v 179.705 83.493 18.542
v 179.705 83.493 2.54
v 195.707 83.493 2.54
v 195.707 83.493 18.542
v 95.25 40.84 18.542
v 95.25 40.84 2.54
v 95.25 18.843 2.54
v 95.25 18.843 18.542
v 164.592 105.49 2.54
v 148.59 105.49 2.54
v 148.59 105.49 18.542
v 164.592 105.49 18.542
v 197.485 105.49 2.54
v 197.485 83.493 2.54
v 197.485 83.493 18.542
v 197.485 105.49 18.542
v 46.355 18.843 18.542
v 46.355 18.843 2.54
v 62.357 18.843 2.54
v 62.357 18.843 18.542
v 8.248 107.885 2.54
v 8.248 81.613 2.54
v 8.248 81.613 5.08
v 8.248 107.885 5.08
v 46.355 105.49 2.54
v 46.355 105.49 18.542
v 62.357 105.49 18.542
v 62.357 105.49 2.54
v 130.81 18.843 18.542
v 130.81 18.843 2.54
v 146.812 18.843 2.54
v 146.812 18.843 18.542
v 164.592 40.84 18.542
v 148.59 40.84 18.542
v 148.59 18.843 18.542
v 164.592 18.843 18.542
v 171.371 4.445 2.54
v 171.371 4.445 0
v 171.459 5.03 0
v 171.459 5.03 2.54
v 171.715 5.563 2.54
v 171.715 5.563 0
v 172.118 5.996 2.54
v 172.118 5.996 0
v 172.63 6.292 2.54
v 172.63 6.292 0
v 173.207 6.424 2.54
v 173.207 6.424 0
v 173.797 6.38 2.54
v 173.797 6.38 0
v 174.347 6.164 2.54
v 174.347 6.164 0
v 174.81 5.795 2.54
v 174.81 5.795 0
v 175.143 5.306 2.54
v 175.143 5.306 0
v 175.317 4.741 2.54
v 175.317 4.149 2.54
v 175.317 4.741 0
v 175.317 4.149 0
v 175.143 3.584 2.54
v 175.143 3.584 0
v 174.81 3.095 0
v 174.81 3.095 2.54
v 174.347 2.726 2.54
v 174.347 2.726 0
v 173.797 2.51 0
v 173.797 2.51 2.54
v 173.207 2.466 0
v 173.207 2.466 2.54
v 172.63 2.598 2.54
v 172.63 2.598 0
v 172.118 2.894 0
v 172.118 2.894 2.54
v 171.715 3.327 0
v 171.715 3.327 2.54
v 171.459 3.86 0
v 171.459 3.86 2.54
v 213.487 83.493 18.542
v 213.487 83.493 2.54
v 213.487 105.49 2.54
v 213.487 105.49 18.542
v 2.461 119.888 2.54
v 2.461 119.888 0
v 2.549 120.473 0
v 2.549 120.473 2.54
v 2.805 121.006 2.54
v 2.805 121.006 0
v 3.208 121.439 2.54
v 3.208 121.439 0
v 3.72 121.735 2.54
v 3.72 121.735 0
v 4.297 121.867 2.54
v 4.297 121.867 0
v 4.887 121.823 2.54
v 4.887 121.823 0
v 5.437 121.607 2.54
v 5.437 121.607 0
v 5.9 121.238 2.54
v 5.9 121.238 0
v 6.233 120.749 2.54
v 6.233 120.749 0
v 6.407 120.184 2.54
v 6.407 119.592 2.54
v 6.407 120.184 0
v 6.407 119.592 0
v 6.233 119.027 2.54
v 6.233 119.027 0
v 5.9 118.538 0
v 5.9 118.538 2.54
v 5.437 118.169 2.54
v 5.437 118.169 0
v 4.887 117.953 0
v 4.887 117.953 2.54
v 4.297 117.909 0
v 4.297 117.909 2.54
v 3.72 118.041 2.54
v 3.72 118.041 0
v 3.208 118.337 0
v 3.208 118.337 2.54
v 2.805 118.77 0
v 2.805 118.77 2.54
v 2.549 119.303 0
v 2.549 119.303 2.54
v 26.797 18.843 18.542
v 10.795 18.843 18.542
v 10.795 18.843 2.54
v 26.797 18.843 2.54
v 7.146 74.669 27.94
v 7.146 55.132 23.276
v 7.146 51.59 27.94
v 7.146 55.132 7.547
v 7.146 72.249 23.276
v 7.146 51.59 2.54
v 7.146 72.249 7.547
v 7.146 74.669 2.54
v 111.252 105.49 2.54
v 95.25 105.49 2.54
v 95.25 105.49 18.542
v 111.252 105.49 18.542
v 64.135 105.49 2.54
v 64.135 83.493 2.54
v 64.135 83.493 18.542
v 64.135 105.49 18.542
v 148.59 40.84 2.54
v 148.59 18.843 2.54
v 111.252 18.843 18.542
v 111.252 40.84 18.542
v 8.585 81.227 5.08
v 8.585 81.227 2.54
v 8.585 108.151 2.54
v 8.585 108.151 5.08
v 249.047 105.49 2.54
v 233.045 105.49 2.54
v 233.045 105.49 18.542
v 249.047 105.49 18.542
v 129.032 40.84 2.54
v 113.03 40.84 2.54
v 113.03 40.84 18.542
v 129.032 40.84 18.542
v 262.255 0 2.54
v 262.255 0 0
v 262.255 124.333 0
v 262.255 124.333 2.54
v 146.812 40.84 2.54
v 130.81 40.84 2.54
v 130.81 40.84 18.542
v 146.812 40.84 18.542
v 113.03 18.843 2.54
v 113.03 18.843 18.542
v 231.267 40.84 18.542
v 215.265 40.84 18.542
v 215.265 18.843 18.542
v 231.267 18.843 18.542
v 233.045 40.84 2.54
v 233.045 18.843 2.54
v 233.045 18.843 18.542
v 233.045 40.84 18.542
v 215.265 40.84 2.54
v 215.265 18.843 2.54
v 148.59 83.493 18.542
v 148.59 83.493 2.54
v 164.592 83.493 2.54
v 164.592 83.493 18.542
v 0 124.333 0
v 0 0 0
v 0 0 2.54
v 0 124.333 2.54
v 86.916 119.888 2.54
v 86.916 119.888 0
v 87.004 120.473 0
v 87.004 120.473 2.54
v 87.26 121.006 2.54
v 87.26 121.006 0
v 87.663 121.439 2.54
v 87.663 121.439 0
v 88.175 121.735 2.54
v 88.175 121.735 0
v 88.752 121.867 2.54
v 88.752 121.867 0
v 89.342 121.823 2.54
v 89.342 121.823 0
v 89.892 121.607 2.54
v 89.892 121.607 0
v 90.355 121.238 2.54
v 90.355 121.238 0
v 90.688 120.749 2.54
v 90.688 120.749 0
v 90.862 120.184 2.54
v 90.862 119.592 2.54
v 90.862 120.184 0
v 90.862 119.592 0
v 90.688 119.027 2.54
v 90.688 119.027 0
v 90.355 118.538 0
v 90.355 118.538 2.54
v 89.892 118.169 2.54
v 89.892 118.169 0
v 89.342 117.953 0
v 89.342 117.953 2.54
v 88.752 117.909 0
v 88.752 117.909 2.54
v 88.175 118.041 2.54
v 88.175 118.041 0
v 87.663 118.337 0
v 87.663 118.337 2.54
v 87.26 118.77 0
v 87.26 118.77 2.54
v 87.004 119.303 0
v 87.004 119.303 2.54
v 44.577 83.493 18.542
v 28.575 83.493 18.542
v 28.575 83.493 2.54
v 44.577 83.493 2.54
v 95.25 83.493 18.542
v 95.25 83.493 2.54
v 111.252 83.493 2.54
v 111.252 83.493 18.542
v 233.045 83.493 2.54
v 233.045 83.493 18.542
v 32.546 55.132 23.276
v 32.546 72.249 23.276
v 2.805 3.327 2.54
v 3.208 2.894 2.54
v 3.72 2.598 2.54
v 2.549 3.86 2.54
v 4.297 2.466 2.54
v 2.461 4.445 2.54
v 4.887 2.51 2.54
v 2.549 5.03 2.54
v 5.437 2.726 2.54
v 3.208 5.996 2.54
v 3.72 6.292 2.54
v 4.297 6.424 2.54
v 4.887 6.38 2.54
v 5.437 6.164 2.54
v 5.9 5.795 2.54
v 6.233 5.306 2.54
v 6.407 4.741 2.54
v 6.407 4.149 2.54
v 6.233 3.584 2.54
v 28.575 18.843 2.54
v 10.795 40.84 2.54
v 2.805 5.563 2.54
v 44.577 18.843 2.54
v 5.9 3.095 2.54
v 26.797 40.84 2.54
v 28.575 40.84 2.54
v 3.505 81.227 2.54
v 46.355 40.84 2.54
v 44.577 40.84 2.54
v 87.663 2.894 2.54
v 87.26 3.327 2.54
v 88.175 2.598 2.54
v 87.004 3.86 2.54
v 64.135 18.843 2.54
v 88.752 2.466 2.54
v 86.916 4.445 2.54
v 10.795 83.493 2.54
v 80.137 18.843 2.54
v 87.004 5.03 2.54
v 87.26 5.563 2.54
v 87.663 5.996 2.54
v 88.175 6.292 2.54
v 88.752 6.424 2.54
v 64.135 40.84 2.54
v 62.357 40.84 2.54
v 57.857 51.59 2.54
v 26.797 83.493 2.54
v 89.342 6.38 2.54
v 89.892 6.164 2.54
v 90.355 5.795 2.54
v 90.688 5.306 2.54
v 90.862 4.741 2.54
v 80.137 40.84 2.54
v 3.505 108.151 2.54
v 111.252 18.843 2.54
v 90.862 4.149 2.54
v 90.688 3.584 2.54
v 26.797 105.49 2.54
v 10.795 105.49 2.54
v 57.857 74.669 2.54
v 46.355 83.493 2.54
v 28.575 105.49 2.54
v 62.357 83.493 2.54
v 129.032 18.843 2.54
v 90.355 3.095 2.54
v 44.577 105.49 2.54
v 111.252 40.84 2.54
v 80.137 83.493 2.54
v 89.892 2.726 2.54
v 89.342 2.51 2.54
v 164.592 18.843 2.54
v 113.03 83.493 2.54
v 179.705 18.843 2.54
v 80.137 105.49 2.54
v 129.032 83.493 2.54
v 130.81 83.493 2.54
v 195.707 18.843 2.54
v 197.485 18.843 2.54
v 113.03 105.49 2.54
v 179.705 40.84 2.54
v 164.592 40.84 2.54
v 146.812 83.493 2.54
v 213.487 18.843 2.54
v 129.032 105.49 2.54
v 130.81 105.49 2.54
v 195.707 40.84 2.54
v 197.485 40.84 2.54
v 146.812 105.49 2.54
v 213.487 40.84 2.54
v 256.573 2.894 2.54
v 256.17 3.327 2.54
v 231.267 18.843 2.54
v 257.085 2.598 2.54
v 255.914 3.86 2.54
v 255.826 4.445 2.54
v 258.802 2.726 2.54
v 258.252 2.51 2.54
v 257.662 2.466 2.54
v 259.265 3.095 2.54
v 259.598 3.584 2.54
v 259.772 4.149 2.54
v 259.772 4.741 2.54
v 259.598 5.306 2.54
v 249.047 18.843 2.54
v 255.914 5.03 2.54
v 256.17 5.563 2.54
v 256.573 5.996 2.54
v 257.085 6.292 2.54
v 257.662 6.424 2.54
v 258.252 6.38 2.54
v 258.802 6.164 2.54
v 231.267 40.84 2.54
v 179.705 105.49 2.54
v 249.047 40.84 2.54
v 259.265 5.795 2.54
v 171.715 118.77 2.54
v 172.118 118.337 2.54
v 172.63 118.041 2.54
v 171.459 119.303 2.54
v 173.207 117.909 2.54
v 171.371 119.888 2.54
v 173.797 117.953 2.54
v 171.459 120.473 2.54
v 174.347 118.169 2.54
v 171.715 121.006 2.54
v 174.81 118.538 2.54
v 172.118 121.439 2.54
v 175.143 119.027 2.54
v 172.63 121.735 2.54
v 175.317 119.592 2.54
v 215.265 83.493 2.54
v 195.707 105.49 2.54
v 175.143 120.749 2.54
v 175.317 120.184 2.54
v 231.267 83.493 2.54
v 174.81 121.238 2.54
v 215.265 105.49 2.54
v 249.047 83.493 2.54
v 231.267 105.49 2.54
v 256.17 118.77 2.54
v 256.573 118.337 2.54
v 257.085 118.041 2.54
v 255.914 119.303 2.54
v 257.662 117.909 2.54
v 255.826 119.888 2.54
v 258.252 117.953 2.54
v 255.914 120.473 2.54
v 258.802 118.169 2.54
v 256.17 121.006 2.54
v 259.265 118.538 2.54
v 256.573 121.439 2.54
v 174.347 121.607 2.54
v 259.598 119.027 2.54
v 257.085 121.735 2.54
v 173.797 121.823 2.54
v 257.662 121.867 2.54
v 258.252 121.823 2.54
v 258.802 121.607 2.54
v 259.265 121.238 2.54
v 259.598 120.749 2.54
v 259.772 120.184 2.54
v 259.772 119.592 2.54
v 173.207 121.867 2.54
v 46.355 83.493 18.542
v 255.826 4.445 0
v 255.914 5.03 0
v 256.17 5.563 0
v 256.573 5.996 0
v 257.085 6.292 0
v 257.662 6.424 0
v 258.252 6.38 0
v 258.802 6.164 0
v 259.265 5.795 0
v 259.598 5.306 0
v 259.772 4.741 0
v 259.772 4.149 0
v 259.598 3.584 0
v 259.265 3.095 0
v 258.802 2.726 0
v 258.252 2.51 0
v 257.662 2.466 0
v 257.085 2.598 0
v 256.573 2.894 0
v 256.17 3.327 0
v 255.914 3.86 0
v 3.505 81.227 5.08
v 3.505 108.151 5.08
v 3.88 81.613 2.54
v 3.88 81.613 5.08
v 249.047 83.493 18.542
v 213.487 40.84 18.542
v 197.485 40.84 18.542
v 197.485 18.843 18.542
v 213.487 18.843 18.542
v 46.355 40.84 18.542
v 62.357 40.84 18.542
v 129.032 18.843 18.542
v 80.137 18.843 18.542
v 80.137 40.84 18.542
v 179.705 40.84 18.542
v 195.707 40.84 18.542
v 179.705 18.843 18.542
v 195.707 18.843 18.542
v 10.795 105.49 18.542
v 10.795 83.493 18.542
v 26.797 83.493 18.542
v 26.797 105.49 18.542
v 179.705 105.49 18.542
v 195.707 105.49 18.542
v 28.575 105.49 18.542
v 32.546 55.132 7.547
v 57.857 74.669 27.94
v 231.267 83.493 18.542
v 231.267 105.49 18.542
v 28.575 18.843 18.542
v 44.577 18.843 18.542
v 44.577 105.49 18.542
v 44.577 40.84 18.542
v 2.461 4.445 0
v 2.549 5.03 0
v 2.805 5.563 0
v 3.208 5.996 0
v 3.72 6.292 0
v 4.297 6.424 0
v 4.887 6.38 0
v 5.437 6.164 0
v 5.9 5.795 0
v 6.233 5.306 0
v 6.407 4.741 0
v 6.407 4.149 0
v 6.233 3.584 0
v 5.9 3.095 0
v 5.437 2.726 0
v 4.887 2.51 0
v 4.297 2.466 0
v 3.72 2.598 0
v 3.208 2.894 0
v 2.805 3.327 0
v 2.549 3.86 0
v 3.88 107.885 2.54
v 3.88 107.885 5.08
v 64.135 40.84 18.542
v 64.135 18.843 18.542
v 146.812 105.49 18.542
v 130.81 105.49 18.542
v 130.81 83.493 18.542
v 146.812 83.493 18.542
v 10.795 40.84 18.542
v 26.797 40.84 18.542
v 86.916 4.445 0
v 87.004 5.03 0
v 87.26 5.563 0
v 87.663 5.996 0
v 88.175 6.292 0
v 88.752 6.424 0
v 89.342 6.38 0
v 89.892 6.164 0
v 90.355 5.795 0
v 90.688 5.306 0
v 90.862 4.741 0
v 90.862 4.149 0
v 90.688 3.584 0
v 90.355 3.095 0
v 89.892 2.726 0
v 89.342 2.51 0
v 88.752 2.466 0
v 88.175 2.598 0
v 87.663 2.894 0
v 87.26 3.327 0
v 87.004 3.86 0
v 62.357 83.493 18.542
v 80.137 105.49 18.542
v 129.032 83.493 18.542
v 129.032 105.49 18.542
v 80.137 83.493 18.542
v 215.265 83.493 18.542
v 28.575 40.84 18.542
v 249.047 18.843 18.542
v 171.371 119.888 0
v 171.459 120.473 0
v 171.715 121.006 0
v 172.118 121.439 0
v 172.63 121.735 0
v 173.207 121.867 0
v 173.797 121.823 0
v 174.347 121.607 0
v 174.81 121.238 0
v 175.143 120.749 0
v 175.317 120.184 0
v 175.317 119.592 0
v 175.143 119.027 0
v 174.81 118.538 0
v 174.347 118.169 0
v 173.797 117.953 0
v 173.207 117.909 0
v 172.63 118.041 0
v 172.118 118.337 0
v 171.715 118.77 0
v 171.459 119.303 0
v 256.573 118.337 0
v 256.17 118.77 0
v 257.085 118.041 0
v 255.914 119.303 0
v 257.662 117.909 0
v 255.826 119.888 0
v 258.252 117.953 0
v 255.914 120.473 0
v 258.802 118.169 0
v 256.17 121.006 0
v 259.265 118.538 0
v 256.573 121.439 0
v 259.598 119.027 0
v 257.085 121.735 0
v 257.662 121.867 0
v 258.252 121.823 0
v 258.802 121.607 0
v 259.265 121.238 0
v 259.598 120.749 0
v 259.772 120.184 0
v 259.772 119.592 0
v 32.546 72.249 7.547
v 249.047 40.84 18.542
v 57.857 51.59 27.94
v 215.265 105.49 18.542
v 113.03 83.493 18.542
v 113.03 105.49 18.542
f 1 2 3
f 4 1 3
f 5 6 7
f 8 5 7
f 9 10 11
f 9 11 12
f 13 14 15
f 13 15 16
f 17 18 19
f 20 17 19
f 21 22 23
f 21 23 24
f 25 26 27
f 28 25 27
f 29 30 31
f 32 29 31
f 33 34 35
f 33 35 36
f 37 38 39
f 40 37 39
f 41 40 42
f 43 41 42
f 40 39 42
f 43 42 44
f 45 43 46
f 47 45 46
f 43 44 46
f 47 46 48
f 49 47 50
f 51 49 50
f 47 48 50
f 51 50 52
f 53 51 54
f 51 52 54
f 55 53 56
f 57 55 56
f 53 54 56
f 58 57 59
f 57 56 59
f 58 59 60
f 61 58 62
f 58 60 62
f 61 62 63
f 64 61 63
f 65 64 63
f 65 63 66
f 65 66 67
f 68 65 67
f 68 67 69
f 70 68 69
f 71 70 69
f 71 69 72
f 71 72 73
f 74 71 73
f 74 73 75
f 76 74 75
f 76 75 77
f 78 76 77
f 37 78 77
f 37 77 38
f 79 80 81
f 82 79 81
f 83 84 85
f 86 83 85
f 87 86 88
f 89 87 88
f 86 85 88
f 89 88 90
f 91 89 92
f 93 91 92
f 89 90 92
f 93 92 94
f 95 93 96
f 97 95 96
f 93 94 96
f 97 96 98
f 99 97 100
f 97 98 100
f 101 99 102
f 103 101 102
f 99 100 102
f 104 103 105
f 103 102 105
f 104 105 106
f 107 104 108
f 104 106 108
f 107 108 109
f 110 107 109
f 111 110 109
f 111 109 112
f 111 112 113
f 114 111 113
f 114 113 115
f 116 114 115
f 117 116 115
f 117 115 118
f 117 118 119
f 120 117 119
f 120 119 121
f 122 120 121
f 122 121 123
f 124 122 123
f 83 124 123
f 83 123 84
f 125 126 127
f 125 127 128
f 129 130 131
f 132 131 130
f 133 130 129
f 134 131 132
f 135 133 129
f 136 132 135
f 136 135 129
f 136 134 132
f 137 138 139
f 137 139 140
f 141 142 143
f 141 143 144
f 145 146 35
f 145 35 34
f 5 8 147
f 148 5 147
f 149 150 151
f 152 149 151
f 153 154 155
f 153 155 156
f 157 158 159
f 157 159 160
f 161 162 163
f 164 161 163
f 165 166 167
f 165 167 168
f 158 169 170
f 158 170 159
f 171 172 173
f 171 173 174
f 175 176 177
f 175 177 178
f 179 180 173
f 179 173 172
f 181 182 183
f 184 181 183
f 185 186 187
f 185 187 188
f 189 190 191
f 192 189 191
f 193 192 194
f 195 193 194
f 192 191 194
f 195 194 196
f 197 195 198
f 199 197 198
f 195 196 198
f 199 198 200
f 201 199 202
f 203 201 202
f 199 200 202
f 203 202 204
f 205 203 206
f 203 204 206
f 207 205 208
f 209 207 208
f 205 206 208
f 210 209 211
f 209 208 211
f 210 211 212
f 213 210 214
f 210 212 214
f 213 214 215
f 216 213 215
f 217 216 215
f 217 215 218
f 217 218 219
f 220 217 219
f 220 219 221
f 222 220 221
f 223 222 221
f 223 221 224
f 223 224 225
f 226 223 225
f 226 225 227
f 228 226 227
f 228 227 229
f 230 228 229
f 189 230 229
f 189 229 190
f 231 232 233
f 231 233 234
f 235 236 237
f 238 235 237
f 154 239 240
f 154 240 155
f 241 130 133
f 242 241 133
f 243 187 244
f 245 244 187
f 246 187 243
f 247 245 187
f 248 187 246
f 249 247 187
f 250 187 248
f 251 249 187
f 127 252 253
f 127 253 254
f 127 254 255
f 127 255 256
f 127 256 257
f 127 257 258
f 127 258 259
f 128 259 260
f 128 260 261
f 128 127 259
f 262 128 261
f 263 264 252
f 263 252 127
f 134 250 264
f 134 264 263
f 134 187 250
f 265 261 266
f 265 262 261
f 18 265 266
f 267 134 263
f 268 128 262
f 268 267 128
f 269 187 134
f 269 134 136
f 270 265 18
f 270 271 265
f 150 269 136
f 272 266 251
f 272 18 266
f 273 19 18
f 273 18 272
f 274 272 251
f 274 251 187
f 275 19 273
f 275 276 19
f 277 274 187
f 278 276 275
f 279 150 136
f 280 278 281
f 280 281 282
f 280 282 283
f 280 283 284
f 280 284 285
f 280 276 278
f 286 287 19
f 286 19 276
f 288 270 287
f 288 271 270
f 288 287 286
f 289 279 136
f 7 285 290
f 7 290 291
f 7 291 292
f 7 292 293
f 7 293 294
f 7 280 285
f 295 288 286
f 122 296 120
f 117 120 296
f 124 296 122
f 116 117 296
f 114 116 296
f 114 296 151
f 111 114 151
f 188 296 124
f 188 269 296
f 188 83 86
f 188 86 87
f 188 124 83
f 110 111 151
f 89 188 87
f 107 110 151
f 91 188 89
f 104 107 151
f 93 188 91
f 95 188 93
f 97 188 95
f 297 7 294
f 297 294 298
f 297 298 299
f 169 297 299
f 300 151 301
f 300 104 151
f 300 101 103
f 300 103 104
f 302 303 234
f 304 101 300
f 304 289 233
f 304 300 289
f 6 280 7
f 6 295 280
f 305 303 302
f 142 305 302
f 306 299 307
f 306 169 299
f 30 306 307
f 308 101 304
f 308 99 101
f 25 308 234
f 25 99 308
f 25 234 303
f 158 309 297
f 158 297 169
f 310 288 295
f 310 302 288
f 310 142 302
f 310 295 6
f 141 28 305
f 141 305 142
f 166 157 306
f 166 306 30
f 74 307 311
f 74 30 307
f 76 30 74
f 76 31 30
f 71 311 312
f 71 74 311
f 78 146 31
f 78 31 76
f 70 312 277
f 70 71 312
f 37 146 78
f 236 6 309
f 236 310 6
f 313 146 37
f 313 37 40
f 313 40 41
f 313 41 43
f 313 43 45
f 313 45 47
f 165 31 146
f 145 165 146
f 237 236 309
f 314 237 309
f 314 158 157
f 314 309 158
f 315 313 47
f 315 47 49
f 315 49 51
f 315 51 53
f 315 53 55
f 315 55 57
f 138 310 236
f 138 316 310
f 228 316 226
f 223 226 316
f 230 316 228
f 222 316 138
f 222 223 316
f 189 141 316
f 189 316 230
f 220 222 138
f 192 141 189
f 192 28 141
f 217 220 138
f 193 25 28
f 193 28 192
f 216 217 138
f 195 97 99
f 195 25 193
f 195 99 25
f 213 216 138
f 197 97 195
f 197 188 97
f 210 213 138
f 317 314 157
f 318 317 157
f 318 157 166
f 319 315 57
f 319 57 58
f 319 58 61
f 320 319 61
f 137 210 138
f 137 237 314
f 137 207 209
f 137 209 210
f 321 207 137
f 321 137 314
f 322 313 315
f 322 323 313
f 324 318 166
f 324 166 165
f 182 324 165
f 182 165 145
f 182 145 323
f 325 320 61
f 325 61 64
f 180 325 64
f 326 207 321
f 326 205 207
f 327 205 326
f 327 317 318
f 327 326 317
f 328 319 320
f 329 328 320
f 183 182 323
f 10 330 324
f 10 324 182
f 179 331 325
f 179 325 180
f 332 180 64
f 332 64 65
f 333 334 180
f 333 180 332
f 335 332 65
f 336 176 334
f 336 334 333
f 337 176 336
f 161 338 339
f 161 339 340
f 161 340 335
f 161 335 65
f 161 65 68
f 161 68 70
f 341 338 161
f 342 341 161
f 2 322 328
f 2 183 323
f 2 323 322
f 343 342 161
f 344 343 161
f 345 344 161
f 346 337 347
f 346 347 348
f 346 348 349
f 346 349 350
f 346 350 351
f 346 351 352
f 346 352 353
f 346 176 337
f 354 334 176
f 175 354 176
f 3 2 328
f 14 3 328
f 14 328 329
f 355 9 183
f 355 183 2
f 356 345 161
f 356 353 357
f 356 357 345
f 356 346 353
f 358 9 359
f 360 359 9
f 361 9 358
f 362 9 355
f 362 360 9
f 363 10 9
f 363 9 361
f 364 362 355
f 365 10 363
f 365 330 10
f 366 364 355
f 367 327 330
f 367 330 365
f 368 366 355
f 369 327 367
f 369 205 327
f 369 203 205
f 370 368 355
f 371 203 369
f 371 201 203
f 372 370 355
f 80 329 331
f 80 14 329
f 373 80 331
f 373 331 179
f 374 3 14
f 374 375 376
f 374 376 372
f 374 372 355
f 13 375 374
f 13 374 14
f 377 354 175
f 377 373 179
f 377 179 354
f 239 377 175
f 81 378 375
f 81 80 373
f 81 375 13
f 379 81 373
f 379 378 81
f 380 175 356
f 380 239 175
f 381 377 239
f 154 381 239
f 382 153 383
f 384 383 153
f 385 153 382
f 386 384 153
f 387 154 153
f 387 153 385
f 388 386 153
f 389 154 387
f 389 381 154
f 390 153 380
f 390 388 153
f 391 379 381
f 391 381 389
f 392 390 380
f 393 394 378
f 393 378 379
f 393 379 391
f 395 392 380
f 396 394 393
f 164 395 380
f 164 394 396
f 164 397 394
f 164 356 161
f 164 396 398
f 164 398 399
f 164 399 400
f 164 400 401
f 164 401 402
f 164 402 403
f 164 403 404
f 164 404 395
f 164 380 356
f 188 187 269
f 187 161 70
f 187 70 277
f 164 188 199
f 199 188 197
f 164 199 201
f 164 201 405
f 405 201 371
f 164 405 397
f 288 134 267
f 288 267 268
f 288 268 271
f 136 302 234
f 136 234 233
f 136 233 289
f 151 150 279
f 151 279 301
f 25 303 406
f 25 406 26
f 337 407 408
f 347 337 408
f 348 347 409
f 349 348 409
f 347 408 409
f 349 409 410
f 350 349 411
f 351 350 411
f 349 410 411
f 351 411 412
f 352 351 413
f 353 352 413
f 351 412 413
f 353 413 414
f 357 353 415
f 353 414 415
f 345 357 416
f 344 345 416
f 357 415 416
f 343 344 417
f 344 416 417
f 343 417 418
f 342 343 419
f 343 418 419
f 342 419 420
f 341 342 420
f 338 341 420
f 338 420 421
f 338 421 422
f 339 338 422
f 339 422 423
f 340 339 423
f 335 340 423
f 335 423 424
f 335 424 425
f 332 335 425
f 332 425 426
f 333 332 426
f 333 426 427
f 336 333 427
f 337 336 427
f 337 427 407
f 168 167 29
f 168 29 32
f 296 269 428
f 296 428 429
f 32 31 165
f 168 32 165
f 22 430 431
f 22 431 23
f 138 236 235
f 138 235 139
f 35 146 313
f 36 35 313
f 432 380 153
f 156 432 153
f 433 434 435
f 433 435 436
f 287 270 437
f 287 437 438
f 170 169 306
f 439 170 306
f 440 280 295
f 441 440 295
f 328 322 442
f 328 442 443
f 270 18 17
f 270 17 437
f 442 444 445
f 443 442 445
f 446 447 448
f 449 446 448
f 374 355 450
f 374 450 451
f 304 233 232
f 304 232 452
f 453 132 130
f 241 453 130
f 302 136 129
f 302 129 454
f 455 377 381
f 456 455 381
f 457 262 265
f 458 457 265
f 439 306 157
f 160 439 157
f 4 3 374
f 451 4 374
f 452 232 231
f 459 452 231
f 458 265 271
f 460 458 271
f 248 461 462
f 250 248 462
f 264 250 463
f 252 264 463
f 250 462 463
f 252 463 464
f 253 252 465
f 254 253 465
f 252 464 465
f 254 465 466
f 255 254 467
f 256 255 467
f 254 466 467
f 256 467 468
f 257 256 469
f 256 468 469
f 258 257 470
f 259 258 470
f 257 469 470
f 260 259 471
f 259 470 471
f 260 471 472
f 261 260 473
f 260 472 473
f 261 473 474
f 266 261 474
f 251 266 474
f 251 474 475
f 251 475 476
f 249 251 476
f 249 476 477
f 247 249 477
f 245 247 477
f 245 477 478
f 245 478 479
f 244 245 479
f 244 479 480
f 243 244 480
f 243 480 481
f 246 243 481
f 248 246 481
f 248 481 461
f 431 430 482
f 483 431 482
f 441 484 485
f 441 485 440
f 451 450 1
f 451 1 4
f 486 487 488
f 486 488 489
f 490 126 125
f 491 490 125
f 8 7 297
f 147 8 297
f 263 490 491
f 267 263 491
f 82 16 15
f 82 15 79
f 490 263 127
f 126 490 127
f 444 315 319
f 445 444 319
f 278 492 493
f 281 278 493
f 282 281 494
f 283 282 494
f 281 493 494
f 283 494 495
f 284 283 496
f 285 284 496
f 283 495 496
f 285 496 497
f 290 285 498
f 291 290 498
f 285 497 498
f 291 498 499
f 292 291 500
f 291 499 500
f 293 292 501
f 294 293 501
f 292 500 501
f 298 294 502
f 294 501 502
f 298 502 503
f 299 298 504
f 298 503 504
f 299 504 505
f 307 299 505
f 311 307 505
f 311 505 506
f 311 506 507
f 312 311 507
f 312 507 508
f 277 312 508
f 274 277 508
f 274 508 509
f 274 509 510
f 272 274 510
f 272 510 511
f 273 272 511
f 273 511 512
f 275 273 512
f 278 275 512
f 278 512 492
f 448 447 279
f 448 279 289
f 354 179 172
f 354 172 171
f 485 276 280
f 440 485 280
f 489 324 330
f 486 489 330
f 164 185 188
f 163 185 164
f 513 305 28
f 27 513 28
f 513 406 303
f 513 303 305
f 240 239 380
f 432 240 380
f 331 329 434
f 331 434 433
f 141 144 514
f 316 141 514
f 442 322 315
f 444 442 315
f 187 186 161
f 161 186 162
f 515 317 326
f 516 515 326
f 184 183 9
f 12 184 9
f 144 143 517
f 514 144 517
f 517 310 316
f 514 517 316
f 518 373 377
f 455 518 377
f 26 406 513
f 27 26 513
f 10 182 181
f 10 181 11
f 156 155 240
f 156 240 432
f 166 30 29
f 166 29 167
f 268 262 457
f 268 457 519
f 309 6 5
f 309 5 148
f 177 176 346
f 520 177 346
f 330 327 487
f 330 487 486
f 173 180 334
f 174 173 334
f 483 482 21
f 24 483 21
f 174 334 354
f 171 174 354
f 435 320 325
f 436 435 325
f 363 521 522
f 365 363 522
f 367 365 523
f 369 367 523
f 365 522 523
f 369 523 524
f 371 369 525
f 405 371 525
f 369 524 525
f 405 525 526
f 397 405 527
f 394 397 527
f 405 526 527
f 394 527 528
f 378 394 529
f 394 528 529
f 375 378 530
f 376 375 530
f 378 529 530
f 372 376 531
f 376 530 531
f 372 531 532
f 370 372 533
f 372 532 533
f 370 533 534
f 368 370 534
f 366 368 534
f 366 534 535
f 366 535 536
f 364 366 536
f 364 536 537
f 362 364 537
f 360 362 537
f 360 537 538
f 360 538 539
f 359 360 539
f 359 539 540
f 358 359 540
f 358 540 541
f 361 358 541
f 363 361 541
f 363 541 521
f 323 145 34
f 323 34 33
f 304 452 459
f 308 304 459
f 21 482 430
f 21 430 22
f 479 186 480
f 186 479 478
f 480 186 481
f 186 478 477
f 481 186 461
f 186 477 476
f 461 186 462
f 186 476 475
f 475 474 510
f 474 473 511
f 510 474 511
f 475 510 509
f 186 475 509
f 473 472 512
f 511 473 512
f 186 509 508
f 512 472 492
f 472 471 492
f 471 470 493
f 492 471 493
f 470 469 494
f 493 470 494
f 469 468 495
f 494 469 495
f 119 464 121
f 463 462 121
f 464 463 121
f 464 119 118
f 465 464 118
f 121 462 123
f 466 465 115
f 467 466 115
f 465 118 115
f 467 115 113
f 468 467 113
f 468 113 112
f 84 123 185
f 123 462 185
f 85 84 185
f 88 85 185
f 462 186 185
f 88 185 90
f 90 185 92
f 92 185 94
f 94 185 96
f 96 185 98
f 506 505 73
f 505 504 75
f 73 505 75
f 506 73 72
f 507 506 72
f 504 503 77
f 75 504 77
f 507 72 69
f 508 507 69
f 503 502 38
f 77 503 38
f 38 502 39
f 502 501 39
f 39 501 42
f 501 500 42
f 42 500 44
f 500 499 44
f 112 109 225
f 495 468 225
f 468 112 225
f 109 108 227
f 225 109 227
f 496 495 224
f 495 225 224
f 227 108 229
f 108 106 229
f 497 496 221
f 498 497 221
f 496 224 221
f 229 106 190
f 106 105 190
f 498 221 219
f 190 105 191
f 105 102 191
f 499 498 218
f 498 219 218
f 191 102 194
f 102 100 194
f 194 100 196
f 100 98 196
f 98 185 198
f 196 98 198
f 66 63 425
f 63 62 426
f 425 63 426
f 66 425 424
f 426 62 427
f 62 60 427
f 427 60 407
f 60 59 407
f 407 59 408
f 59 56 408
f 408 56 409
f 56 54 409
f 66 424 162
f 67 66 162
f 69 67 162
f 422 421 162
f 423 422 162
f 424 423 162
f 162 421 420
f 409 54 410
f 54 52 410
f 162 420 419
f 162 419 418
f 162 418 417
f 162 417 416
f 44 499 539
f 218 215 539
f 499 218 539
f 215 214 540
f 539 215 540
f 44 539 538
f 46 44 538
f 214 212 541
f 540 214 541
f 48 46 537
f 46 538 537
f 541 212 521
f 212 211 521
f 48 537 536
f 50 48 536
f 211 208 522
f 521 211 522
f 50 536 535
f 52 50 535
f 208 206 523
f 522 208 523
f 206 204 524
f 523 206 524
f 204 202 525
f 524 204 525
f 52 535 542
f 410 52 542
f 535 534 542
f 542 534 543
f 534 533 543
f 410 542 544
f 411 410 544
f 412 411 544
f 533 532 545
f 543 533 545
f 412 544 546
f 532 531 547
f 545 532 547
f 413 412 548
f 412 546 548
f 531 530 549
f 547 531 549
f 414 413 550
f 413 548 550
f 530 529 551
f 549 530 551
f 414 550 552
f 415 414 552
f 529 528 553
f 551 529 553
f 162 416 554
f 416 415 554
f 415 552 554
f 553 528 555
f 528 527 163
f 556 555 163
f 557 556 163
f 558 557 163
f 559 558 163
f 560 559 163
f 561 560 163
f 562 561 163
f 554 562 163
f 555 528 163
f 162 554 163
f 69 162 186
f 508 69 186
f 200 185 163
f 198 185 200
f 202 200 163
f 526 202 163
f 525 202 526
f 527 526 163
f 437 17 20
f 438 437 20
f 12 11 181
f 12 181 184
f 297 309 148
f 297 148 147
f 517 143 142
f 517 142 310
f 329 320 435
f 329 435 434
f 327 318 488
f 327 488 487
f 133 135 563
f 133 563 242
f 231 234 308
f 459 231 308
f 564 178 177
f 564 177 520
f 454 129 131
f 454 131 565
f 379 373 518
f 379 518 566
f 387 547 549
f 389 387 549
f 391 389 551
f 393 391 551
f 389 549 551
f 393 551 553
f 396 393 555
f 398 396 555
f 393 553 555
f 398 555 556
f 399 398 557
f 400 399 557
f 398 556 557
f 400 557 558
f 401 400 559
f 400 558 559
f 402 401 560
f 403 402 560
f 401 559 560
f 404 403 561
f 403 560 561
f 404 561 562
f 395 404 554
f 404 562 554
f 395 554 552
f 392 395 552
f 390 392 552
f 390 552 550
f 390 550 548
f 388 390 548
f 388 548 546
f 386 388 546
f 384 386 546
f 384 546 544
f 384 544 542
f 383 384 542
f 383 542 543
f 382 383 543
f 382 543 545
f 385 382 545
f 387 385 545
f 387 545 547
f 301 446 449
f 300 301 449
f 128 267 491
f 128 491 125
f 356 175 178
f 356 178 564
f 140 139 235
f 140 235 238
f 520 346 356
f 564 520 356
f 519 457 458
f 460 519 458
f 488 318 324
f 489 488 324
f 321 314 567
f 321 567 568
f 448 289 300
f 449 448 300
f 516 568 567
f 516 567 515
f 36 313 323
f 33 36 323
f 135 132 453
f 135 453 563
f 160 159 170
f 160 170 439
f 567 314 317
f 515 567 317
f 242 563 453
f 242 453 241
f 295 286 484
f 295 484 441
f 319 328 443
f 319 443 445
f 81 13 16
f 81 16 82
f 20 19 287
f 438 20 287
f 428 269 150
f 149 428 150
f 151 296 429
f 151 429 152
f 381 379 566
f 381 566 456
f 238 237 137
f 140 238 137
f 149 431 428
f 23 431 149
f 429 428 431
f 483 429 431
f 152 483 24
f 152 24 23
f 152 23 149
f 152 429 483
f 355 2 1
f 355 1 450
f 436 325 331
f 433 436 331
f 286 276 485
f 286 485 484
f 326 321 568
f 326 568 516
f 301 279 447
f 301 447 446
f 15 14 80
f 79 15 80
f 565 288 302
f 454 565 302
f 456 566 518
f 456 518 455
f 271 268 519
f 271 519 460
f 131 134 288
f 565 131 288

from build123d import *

# Parameters (mm, degrees)
SKETCH1_W                       = 262.255
SKETCH1_H                       = 124.333
BOSS_EXTRUDE1_DEPTH             = 2.54
F_5_32_0_15625_DIAMETER_HOLE1_D = 3.96875
SKETCH12_W                      = 5.08
SKETCH12_H                      = 26.924
SKETCH12_W_2                    = 4.367686067
SKETCH12_H_2                    = 26.272785271
BOSS_EXTRUDE2_DEPTH             = 2.54
SKETCH13_W                      = 50.710492808
SKETCH13_H                      = 23.078831344
BOSS_EXTRUDE3_DEPTH             = 25.4
SKETCH14_W                      = 15.728561486
SKETCH14_H                      = 17.117120152
CUT_EXTRUDE1_DEPTH              = 25.4
SKETCH16_W                      = 16.002
SKETCH16_H                      = 21.9964
BOSS_EXTRUDE5_DEPTH             = 16.002
LPATTERN1_COUNT                 = 4
LPATTERN1_PITCH                 = 17.78
MIRROR1_COPY_1_SKETCH_W         = 16.002
MIRROR1_COPY_1_SKETCH_H         = 21.9964
MIRROR1_COPY_1_DEPTH            = 16.002
MIRROR1_COPY_2_SKETCH_W         = 16.002
MIRROR1_COPY_2_SKETCH_H         = 21.9964
MIRROR1_COPY_2_DEPTH            = 16.002
MIRROR1_COPY_3_SKETCH_W         = 16.002
MIRROR1_COPY_3_SKETCH_H         = 21.9964
MIRROR1_COPY_3_DEPTH            = 16.002


with BuildPart() as part:
    # Sketch1 → Boss-Extrude1 (new body)
    with BuildSketch(Plane.XY):
        with Locations((131.1275, 62.1665)):
            Rectangle(SKETCH1_W, SKETCH1_H)
    extrude(amount=BOSS_EXTRUDE1_DEPTH)

    # 5/32 (0.15625) Diameter Hole1 (through all)
    with Locations(Plane.XY.offset(2.54)):
        with Locations((4.445, 119.888), (88.9, 119.888), (173.355, 119.888), (257.81, 119.888), (4.445, 4.445), (88.9, 4.445), (173.355, 4.445), (257.81, 4.445)):
            Hole(F_5_32_0_15625_DIAMETER_HOLE1_D / 2)

    # Sketch12 → Boss-Extrude2 (add)
    with BuildSketch(Plane.XY.offset(2.54)):
        with Locations((6.044810111, 94.689164449)):
            Rectangle(SKETCH12_W, SKETCH12_H)
        with Locations((6.063998692, 94.748985924)):
            Rectangle(SKETCH12_W_2, SKETCH12_H_2, mode=Mode.SUBTRACT)
    extrude(amount=BOSS_EXTRUDE2_DEPTH)

    # Sketch13 → Boss-Extrude3 (add)
    with BuildSketch(Plane.XY.offset(2.54)):
        with Locations((32.501526889, 63.129188548)):
            Rectangle(SKETCH13_W, SKETCH13_H)
    extrude(amount=BOSS_EXTRUDE3_DEPTH)

    # Sketch14 → Cut-Extrude1 (cut)
    with BuildSketch(Plane.ZY.offset(-7.146280485)):
        with Locations((15.411737976, 63.690176449)):
            Rectangle(SKETCH14_W, SKETCH14_H)
    extrude(amount=-CUT_EXTRUDE1_DEPTH, mode=Mode.SUBTRACT)

    # Sketch16 → Boss-Extrude5 (add)
    with BuildSketch(Plane.XY.offset(2.54)):
        with Locations((103.251, 94.491464858)):
            Rectangle(SKETCH16_W, SKETCH16_H)
        with Locations((18.796, 94.491464858)):
            Rectangle(SKETCH16_W, SKETCH16_H)
        with Locations((187.706, 94.491464858)):
            Rectangle(SKETCH16_W, SKETCH16_H)
    boss_extrude5 = extrude(amount=BOSS_EXTRUDE5_DEPTH)

    # LPattern1: Boss-Extrude5 ×4
    with Locations(*[(i * LPATTERN1_PITCH, 0, 0) for i in range(1, LPATTERN1_COUNT)]):
        add(boss_extrude5)

    # Mirror1: Boss-Extrude5 across plane
    add(boss_extrude5.mirror(Plane.ZX.offset(62.1665)))

    # Mirror1 copy 1 sketch → Mirror1 copy 1 (add)
    with BuildSketch(Plane(origin=(17.78, 124.333, 2.54), x_dir=(1, 0, 0), z_dir=(0, 0, 1))):
        with Locations((103.251, -94.491464858)):
            Rectangle(MIRROR1_COPY_1_SKETCH_W, MIRROR1_COPY_1_SKETCH_H)
        with Locations((18.796, -94.491464858)):
            Rectangle(MIRROR1_COPY_1_SKETCH_W, MIRROR1_COPY_1_SKETCH_H)
        with Locations((187.706, -94.491464858)):
            Rectangle(MIRROR1_COPY_1_SKETCH_W, MIRROR1_COPY_1_SKETCH_H)
    extrude(amount=MIRROR1_COPY_1_DEPTH)

    # Mirror1 copy 2 sketch → Mirror1 copy 2 (add)
    with BuildSketch(Plane(origin=(35.56, 124.333, 2.54), x_dir=(1, 0, 0), z_dir=(0, 0, 1))):
        with Locations((103.251, -94.491464858)):
            Rectangle(MIRROR1_COPY_2_SKETCH_W, MIRROR1_COPY_2_SKETCH_H)
        with Locations((18.796, -94.491464858)):
            Rectangle(MIRROR1_COPY_2_SKETCH_W, MIRROR1_COPY_2_SKETCH_H)
        with Locations((187.706, -94.491464858)):
            Rectangle(MIRROR1_COPY_2_SKETCH_W, MIRROR1_COPY_2_SKETCH_H)
    extrude(amount=MIRROR1_COPY_2_DEPTH)

    # Mirror1 copy 3 sketch → Mirror1 copy 3 (add)
    with BuildSketch(Plane(origin=(53.34, 124.333, 2.54), x_dir=(1, 0, 0), z_dir=(0, 0, 1))):
        with Locations((103.251, -94.491464858)):
            Rectangle(MIRROR1_COPY_3_SKETCH_W, MIRROR1_COPY_3_SKETCH_H)
        with Locations((18.796, -94.491464858)):
            Rectangle(MIRROR1_COPY_3_SKETCH_W, MIRROR1_COPY_3_SKETCH_H)
        with Locations((187.706, -94.491464858)):
            Rectangle(MIRROR1_COPY_3_SKETCH_W, MIRROR1_COPY_3_SKETCH_H)
    extrude(amount=MIRROR1_COPY_3_DEPTH)


solid = part.part
